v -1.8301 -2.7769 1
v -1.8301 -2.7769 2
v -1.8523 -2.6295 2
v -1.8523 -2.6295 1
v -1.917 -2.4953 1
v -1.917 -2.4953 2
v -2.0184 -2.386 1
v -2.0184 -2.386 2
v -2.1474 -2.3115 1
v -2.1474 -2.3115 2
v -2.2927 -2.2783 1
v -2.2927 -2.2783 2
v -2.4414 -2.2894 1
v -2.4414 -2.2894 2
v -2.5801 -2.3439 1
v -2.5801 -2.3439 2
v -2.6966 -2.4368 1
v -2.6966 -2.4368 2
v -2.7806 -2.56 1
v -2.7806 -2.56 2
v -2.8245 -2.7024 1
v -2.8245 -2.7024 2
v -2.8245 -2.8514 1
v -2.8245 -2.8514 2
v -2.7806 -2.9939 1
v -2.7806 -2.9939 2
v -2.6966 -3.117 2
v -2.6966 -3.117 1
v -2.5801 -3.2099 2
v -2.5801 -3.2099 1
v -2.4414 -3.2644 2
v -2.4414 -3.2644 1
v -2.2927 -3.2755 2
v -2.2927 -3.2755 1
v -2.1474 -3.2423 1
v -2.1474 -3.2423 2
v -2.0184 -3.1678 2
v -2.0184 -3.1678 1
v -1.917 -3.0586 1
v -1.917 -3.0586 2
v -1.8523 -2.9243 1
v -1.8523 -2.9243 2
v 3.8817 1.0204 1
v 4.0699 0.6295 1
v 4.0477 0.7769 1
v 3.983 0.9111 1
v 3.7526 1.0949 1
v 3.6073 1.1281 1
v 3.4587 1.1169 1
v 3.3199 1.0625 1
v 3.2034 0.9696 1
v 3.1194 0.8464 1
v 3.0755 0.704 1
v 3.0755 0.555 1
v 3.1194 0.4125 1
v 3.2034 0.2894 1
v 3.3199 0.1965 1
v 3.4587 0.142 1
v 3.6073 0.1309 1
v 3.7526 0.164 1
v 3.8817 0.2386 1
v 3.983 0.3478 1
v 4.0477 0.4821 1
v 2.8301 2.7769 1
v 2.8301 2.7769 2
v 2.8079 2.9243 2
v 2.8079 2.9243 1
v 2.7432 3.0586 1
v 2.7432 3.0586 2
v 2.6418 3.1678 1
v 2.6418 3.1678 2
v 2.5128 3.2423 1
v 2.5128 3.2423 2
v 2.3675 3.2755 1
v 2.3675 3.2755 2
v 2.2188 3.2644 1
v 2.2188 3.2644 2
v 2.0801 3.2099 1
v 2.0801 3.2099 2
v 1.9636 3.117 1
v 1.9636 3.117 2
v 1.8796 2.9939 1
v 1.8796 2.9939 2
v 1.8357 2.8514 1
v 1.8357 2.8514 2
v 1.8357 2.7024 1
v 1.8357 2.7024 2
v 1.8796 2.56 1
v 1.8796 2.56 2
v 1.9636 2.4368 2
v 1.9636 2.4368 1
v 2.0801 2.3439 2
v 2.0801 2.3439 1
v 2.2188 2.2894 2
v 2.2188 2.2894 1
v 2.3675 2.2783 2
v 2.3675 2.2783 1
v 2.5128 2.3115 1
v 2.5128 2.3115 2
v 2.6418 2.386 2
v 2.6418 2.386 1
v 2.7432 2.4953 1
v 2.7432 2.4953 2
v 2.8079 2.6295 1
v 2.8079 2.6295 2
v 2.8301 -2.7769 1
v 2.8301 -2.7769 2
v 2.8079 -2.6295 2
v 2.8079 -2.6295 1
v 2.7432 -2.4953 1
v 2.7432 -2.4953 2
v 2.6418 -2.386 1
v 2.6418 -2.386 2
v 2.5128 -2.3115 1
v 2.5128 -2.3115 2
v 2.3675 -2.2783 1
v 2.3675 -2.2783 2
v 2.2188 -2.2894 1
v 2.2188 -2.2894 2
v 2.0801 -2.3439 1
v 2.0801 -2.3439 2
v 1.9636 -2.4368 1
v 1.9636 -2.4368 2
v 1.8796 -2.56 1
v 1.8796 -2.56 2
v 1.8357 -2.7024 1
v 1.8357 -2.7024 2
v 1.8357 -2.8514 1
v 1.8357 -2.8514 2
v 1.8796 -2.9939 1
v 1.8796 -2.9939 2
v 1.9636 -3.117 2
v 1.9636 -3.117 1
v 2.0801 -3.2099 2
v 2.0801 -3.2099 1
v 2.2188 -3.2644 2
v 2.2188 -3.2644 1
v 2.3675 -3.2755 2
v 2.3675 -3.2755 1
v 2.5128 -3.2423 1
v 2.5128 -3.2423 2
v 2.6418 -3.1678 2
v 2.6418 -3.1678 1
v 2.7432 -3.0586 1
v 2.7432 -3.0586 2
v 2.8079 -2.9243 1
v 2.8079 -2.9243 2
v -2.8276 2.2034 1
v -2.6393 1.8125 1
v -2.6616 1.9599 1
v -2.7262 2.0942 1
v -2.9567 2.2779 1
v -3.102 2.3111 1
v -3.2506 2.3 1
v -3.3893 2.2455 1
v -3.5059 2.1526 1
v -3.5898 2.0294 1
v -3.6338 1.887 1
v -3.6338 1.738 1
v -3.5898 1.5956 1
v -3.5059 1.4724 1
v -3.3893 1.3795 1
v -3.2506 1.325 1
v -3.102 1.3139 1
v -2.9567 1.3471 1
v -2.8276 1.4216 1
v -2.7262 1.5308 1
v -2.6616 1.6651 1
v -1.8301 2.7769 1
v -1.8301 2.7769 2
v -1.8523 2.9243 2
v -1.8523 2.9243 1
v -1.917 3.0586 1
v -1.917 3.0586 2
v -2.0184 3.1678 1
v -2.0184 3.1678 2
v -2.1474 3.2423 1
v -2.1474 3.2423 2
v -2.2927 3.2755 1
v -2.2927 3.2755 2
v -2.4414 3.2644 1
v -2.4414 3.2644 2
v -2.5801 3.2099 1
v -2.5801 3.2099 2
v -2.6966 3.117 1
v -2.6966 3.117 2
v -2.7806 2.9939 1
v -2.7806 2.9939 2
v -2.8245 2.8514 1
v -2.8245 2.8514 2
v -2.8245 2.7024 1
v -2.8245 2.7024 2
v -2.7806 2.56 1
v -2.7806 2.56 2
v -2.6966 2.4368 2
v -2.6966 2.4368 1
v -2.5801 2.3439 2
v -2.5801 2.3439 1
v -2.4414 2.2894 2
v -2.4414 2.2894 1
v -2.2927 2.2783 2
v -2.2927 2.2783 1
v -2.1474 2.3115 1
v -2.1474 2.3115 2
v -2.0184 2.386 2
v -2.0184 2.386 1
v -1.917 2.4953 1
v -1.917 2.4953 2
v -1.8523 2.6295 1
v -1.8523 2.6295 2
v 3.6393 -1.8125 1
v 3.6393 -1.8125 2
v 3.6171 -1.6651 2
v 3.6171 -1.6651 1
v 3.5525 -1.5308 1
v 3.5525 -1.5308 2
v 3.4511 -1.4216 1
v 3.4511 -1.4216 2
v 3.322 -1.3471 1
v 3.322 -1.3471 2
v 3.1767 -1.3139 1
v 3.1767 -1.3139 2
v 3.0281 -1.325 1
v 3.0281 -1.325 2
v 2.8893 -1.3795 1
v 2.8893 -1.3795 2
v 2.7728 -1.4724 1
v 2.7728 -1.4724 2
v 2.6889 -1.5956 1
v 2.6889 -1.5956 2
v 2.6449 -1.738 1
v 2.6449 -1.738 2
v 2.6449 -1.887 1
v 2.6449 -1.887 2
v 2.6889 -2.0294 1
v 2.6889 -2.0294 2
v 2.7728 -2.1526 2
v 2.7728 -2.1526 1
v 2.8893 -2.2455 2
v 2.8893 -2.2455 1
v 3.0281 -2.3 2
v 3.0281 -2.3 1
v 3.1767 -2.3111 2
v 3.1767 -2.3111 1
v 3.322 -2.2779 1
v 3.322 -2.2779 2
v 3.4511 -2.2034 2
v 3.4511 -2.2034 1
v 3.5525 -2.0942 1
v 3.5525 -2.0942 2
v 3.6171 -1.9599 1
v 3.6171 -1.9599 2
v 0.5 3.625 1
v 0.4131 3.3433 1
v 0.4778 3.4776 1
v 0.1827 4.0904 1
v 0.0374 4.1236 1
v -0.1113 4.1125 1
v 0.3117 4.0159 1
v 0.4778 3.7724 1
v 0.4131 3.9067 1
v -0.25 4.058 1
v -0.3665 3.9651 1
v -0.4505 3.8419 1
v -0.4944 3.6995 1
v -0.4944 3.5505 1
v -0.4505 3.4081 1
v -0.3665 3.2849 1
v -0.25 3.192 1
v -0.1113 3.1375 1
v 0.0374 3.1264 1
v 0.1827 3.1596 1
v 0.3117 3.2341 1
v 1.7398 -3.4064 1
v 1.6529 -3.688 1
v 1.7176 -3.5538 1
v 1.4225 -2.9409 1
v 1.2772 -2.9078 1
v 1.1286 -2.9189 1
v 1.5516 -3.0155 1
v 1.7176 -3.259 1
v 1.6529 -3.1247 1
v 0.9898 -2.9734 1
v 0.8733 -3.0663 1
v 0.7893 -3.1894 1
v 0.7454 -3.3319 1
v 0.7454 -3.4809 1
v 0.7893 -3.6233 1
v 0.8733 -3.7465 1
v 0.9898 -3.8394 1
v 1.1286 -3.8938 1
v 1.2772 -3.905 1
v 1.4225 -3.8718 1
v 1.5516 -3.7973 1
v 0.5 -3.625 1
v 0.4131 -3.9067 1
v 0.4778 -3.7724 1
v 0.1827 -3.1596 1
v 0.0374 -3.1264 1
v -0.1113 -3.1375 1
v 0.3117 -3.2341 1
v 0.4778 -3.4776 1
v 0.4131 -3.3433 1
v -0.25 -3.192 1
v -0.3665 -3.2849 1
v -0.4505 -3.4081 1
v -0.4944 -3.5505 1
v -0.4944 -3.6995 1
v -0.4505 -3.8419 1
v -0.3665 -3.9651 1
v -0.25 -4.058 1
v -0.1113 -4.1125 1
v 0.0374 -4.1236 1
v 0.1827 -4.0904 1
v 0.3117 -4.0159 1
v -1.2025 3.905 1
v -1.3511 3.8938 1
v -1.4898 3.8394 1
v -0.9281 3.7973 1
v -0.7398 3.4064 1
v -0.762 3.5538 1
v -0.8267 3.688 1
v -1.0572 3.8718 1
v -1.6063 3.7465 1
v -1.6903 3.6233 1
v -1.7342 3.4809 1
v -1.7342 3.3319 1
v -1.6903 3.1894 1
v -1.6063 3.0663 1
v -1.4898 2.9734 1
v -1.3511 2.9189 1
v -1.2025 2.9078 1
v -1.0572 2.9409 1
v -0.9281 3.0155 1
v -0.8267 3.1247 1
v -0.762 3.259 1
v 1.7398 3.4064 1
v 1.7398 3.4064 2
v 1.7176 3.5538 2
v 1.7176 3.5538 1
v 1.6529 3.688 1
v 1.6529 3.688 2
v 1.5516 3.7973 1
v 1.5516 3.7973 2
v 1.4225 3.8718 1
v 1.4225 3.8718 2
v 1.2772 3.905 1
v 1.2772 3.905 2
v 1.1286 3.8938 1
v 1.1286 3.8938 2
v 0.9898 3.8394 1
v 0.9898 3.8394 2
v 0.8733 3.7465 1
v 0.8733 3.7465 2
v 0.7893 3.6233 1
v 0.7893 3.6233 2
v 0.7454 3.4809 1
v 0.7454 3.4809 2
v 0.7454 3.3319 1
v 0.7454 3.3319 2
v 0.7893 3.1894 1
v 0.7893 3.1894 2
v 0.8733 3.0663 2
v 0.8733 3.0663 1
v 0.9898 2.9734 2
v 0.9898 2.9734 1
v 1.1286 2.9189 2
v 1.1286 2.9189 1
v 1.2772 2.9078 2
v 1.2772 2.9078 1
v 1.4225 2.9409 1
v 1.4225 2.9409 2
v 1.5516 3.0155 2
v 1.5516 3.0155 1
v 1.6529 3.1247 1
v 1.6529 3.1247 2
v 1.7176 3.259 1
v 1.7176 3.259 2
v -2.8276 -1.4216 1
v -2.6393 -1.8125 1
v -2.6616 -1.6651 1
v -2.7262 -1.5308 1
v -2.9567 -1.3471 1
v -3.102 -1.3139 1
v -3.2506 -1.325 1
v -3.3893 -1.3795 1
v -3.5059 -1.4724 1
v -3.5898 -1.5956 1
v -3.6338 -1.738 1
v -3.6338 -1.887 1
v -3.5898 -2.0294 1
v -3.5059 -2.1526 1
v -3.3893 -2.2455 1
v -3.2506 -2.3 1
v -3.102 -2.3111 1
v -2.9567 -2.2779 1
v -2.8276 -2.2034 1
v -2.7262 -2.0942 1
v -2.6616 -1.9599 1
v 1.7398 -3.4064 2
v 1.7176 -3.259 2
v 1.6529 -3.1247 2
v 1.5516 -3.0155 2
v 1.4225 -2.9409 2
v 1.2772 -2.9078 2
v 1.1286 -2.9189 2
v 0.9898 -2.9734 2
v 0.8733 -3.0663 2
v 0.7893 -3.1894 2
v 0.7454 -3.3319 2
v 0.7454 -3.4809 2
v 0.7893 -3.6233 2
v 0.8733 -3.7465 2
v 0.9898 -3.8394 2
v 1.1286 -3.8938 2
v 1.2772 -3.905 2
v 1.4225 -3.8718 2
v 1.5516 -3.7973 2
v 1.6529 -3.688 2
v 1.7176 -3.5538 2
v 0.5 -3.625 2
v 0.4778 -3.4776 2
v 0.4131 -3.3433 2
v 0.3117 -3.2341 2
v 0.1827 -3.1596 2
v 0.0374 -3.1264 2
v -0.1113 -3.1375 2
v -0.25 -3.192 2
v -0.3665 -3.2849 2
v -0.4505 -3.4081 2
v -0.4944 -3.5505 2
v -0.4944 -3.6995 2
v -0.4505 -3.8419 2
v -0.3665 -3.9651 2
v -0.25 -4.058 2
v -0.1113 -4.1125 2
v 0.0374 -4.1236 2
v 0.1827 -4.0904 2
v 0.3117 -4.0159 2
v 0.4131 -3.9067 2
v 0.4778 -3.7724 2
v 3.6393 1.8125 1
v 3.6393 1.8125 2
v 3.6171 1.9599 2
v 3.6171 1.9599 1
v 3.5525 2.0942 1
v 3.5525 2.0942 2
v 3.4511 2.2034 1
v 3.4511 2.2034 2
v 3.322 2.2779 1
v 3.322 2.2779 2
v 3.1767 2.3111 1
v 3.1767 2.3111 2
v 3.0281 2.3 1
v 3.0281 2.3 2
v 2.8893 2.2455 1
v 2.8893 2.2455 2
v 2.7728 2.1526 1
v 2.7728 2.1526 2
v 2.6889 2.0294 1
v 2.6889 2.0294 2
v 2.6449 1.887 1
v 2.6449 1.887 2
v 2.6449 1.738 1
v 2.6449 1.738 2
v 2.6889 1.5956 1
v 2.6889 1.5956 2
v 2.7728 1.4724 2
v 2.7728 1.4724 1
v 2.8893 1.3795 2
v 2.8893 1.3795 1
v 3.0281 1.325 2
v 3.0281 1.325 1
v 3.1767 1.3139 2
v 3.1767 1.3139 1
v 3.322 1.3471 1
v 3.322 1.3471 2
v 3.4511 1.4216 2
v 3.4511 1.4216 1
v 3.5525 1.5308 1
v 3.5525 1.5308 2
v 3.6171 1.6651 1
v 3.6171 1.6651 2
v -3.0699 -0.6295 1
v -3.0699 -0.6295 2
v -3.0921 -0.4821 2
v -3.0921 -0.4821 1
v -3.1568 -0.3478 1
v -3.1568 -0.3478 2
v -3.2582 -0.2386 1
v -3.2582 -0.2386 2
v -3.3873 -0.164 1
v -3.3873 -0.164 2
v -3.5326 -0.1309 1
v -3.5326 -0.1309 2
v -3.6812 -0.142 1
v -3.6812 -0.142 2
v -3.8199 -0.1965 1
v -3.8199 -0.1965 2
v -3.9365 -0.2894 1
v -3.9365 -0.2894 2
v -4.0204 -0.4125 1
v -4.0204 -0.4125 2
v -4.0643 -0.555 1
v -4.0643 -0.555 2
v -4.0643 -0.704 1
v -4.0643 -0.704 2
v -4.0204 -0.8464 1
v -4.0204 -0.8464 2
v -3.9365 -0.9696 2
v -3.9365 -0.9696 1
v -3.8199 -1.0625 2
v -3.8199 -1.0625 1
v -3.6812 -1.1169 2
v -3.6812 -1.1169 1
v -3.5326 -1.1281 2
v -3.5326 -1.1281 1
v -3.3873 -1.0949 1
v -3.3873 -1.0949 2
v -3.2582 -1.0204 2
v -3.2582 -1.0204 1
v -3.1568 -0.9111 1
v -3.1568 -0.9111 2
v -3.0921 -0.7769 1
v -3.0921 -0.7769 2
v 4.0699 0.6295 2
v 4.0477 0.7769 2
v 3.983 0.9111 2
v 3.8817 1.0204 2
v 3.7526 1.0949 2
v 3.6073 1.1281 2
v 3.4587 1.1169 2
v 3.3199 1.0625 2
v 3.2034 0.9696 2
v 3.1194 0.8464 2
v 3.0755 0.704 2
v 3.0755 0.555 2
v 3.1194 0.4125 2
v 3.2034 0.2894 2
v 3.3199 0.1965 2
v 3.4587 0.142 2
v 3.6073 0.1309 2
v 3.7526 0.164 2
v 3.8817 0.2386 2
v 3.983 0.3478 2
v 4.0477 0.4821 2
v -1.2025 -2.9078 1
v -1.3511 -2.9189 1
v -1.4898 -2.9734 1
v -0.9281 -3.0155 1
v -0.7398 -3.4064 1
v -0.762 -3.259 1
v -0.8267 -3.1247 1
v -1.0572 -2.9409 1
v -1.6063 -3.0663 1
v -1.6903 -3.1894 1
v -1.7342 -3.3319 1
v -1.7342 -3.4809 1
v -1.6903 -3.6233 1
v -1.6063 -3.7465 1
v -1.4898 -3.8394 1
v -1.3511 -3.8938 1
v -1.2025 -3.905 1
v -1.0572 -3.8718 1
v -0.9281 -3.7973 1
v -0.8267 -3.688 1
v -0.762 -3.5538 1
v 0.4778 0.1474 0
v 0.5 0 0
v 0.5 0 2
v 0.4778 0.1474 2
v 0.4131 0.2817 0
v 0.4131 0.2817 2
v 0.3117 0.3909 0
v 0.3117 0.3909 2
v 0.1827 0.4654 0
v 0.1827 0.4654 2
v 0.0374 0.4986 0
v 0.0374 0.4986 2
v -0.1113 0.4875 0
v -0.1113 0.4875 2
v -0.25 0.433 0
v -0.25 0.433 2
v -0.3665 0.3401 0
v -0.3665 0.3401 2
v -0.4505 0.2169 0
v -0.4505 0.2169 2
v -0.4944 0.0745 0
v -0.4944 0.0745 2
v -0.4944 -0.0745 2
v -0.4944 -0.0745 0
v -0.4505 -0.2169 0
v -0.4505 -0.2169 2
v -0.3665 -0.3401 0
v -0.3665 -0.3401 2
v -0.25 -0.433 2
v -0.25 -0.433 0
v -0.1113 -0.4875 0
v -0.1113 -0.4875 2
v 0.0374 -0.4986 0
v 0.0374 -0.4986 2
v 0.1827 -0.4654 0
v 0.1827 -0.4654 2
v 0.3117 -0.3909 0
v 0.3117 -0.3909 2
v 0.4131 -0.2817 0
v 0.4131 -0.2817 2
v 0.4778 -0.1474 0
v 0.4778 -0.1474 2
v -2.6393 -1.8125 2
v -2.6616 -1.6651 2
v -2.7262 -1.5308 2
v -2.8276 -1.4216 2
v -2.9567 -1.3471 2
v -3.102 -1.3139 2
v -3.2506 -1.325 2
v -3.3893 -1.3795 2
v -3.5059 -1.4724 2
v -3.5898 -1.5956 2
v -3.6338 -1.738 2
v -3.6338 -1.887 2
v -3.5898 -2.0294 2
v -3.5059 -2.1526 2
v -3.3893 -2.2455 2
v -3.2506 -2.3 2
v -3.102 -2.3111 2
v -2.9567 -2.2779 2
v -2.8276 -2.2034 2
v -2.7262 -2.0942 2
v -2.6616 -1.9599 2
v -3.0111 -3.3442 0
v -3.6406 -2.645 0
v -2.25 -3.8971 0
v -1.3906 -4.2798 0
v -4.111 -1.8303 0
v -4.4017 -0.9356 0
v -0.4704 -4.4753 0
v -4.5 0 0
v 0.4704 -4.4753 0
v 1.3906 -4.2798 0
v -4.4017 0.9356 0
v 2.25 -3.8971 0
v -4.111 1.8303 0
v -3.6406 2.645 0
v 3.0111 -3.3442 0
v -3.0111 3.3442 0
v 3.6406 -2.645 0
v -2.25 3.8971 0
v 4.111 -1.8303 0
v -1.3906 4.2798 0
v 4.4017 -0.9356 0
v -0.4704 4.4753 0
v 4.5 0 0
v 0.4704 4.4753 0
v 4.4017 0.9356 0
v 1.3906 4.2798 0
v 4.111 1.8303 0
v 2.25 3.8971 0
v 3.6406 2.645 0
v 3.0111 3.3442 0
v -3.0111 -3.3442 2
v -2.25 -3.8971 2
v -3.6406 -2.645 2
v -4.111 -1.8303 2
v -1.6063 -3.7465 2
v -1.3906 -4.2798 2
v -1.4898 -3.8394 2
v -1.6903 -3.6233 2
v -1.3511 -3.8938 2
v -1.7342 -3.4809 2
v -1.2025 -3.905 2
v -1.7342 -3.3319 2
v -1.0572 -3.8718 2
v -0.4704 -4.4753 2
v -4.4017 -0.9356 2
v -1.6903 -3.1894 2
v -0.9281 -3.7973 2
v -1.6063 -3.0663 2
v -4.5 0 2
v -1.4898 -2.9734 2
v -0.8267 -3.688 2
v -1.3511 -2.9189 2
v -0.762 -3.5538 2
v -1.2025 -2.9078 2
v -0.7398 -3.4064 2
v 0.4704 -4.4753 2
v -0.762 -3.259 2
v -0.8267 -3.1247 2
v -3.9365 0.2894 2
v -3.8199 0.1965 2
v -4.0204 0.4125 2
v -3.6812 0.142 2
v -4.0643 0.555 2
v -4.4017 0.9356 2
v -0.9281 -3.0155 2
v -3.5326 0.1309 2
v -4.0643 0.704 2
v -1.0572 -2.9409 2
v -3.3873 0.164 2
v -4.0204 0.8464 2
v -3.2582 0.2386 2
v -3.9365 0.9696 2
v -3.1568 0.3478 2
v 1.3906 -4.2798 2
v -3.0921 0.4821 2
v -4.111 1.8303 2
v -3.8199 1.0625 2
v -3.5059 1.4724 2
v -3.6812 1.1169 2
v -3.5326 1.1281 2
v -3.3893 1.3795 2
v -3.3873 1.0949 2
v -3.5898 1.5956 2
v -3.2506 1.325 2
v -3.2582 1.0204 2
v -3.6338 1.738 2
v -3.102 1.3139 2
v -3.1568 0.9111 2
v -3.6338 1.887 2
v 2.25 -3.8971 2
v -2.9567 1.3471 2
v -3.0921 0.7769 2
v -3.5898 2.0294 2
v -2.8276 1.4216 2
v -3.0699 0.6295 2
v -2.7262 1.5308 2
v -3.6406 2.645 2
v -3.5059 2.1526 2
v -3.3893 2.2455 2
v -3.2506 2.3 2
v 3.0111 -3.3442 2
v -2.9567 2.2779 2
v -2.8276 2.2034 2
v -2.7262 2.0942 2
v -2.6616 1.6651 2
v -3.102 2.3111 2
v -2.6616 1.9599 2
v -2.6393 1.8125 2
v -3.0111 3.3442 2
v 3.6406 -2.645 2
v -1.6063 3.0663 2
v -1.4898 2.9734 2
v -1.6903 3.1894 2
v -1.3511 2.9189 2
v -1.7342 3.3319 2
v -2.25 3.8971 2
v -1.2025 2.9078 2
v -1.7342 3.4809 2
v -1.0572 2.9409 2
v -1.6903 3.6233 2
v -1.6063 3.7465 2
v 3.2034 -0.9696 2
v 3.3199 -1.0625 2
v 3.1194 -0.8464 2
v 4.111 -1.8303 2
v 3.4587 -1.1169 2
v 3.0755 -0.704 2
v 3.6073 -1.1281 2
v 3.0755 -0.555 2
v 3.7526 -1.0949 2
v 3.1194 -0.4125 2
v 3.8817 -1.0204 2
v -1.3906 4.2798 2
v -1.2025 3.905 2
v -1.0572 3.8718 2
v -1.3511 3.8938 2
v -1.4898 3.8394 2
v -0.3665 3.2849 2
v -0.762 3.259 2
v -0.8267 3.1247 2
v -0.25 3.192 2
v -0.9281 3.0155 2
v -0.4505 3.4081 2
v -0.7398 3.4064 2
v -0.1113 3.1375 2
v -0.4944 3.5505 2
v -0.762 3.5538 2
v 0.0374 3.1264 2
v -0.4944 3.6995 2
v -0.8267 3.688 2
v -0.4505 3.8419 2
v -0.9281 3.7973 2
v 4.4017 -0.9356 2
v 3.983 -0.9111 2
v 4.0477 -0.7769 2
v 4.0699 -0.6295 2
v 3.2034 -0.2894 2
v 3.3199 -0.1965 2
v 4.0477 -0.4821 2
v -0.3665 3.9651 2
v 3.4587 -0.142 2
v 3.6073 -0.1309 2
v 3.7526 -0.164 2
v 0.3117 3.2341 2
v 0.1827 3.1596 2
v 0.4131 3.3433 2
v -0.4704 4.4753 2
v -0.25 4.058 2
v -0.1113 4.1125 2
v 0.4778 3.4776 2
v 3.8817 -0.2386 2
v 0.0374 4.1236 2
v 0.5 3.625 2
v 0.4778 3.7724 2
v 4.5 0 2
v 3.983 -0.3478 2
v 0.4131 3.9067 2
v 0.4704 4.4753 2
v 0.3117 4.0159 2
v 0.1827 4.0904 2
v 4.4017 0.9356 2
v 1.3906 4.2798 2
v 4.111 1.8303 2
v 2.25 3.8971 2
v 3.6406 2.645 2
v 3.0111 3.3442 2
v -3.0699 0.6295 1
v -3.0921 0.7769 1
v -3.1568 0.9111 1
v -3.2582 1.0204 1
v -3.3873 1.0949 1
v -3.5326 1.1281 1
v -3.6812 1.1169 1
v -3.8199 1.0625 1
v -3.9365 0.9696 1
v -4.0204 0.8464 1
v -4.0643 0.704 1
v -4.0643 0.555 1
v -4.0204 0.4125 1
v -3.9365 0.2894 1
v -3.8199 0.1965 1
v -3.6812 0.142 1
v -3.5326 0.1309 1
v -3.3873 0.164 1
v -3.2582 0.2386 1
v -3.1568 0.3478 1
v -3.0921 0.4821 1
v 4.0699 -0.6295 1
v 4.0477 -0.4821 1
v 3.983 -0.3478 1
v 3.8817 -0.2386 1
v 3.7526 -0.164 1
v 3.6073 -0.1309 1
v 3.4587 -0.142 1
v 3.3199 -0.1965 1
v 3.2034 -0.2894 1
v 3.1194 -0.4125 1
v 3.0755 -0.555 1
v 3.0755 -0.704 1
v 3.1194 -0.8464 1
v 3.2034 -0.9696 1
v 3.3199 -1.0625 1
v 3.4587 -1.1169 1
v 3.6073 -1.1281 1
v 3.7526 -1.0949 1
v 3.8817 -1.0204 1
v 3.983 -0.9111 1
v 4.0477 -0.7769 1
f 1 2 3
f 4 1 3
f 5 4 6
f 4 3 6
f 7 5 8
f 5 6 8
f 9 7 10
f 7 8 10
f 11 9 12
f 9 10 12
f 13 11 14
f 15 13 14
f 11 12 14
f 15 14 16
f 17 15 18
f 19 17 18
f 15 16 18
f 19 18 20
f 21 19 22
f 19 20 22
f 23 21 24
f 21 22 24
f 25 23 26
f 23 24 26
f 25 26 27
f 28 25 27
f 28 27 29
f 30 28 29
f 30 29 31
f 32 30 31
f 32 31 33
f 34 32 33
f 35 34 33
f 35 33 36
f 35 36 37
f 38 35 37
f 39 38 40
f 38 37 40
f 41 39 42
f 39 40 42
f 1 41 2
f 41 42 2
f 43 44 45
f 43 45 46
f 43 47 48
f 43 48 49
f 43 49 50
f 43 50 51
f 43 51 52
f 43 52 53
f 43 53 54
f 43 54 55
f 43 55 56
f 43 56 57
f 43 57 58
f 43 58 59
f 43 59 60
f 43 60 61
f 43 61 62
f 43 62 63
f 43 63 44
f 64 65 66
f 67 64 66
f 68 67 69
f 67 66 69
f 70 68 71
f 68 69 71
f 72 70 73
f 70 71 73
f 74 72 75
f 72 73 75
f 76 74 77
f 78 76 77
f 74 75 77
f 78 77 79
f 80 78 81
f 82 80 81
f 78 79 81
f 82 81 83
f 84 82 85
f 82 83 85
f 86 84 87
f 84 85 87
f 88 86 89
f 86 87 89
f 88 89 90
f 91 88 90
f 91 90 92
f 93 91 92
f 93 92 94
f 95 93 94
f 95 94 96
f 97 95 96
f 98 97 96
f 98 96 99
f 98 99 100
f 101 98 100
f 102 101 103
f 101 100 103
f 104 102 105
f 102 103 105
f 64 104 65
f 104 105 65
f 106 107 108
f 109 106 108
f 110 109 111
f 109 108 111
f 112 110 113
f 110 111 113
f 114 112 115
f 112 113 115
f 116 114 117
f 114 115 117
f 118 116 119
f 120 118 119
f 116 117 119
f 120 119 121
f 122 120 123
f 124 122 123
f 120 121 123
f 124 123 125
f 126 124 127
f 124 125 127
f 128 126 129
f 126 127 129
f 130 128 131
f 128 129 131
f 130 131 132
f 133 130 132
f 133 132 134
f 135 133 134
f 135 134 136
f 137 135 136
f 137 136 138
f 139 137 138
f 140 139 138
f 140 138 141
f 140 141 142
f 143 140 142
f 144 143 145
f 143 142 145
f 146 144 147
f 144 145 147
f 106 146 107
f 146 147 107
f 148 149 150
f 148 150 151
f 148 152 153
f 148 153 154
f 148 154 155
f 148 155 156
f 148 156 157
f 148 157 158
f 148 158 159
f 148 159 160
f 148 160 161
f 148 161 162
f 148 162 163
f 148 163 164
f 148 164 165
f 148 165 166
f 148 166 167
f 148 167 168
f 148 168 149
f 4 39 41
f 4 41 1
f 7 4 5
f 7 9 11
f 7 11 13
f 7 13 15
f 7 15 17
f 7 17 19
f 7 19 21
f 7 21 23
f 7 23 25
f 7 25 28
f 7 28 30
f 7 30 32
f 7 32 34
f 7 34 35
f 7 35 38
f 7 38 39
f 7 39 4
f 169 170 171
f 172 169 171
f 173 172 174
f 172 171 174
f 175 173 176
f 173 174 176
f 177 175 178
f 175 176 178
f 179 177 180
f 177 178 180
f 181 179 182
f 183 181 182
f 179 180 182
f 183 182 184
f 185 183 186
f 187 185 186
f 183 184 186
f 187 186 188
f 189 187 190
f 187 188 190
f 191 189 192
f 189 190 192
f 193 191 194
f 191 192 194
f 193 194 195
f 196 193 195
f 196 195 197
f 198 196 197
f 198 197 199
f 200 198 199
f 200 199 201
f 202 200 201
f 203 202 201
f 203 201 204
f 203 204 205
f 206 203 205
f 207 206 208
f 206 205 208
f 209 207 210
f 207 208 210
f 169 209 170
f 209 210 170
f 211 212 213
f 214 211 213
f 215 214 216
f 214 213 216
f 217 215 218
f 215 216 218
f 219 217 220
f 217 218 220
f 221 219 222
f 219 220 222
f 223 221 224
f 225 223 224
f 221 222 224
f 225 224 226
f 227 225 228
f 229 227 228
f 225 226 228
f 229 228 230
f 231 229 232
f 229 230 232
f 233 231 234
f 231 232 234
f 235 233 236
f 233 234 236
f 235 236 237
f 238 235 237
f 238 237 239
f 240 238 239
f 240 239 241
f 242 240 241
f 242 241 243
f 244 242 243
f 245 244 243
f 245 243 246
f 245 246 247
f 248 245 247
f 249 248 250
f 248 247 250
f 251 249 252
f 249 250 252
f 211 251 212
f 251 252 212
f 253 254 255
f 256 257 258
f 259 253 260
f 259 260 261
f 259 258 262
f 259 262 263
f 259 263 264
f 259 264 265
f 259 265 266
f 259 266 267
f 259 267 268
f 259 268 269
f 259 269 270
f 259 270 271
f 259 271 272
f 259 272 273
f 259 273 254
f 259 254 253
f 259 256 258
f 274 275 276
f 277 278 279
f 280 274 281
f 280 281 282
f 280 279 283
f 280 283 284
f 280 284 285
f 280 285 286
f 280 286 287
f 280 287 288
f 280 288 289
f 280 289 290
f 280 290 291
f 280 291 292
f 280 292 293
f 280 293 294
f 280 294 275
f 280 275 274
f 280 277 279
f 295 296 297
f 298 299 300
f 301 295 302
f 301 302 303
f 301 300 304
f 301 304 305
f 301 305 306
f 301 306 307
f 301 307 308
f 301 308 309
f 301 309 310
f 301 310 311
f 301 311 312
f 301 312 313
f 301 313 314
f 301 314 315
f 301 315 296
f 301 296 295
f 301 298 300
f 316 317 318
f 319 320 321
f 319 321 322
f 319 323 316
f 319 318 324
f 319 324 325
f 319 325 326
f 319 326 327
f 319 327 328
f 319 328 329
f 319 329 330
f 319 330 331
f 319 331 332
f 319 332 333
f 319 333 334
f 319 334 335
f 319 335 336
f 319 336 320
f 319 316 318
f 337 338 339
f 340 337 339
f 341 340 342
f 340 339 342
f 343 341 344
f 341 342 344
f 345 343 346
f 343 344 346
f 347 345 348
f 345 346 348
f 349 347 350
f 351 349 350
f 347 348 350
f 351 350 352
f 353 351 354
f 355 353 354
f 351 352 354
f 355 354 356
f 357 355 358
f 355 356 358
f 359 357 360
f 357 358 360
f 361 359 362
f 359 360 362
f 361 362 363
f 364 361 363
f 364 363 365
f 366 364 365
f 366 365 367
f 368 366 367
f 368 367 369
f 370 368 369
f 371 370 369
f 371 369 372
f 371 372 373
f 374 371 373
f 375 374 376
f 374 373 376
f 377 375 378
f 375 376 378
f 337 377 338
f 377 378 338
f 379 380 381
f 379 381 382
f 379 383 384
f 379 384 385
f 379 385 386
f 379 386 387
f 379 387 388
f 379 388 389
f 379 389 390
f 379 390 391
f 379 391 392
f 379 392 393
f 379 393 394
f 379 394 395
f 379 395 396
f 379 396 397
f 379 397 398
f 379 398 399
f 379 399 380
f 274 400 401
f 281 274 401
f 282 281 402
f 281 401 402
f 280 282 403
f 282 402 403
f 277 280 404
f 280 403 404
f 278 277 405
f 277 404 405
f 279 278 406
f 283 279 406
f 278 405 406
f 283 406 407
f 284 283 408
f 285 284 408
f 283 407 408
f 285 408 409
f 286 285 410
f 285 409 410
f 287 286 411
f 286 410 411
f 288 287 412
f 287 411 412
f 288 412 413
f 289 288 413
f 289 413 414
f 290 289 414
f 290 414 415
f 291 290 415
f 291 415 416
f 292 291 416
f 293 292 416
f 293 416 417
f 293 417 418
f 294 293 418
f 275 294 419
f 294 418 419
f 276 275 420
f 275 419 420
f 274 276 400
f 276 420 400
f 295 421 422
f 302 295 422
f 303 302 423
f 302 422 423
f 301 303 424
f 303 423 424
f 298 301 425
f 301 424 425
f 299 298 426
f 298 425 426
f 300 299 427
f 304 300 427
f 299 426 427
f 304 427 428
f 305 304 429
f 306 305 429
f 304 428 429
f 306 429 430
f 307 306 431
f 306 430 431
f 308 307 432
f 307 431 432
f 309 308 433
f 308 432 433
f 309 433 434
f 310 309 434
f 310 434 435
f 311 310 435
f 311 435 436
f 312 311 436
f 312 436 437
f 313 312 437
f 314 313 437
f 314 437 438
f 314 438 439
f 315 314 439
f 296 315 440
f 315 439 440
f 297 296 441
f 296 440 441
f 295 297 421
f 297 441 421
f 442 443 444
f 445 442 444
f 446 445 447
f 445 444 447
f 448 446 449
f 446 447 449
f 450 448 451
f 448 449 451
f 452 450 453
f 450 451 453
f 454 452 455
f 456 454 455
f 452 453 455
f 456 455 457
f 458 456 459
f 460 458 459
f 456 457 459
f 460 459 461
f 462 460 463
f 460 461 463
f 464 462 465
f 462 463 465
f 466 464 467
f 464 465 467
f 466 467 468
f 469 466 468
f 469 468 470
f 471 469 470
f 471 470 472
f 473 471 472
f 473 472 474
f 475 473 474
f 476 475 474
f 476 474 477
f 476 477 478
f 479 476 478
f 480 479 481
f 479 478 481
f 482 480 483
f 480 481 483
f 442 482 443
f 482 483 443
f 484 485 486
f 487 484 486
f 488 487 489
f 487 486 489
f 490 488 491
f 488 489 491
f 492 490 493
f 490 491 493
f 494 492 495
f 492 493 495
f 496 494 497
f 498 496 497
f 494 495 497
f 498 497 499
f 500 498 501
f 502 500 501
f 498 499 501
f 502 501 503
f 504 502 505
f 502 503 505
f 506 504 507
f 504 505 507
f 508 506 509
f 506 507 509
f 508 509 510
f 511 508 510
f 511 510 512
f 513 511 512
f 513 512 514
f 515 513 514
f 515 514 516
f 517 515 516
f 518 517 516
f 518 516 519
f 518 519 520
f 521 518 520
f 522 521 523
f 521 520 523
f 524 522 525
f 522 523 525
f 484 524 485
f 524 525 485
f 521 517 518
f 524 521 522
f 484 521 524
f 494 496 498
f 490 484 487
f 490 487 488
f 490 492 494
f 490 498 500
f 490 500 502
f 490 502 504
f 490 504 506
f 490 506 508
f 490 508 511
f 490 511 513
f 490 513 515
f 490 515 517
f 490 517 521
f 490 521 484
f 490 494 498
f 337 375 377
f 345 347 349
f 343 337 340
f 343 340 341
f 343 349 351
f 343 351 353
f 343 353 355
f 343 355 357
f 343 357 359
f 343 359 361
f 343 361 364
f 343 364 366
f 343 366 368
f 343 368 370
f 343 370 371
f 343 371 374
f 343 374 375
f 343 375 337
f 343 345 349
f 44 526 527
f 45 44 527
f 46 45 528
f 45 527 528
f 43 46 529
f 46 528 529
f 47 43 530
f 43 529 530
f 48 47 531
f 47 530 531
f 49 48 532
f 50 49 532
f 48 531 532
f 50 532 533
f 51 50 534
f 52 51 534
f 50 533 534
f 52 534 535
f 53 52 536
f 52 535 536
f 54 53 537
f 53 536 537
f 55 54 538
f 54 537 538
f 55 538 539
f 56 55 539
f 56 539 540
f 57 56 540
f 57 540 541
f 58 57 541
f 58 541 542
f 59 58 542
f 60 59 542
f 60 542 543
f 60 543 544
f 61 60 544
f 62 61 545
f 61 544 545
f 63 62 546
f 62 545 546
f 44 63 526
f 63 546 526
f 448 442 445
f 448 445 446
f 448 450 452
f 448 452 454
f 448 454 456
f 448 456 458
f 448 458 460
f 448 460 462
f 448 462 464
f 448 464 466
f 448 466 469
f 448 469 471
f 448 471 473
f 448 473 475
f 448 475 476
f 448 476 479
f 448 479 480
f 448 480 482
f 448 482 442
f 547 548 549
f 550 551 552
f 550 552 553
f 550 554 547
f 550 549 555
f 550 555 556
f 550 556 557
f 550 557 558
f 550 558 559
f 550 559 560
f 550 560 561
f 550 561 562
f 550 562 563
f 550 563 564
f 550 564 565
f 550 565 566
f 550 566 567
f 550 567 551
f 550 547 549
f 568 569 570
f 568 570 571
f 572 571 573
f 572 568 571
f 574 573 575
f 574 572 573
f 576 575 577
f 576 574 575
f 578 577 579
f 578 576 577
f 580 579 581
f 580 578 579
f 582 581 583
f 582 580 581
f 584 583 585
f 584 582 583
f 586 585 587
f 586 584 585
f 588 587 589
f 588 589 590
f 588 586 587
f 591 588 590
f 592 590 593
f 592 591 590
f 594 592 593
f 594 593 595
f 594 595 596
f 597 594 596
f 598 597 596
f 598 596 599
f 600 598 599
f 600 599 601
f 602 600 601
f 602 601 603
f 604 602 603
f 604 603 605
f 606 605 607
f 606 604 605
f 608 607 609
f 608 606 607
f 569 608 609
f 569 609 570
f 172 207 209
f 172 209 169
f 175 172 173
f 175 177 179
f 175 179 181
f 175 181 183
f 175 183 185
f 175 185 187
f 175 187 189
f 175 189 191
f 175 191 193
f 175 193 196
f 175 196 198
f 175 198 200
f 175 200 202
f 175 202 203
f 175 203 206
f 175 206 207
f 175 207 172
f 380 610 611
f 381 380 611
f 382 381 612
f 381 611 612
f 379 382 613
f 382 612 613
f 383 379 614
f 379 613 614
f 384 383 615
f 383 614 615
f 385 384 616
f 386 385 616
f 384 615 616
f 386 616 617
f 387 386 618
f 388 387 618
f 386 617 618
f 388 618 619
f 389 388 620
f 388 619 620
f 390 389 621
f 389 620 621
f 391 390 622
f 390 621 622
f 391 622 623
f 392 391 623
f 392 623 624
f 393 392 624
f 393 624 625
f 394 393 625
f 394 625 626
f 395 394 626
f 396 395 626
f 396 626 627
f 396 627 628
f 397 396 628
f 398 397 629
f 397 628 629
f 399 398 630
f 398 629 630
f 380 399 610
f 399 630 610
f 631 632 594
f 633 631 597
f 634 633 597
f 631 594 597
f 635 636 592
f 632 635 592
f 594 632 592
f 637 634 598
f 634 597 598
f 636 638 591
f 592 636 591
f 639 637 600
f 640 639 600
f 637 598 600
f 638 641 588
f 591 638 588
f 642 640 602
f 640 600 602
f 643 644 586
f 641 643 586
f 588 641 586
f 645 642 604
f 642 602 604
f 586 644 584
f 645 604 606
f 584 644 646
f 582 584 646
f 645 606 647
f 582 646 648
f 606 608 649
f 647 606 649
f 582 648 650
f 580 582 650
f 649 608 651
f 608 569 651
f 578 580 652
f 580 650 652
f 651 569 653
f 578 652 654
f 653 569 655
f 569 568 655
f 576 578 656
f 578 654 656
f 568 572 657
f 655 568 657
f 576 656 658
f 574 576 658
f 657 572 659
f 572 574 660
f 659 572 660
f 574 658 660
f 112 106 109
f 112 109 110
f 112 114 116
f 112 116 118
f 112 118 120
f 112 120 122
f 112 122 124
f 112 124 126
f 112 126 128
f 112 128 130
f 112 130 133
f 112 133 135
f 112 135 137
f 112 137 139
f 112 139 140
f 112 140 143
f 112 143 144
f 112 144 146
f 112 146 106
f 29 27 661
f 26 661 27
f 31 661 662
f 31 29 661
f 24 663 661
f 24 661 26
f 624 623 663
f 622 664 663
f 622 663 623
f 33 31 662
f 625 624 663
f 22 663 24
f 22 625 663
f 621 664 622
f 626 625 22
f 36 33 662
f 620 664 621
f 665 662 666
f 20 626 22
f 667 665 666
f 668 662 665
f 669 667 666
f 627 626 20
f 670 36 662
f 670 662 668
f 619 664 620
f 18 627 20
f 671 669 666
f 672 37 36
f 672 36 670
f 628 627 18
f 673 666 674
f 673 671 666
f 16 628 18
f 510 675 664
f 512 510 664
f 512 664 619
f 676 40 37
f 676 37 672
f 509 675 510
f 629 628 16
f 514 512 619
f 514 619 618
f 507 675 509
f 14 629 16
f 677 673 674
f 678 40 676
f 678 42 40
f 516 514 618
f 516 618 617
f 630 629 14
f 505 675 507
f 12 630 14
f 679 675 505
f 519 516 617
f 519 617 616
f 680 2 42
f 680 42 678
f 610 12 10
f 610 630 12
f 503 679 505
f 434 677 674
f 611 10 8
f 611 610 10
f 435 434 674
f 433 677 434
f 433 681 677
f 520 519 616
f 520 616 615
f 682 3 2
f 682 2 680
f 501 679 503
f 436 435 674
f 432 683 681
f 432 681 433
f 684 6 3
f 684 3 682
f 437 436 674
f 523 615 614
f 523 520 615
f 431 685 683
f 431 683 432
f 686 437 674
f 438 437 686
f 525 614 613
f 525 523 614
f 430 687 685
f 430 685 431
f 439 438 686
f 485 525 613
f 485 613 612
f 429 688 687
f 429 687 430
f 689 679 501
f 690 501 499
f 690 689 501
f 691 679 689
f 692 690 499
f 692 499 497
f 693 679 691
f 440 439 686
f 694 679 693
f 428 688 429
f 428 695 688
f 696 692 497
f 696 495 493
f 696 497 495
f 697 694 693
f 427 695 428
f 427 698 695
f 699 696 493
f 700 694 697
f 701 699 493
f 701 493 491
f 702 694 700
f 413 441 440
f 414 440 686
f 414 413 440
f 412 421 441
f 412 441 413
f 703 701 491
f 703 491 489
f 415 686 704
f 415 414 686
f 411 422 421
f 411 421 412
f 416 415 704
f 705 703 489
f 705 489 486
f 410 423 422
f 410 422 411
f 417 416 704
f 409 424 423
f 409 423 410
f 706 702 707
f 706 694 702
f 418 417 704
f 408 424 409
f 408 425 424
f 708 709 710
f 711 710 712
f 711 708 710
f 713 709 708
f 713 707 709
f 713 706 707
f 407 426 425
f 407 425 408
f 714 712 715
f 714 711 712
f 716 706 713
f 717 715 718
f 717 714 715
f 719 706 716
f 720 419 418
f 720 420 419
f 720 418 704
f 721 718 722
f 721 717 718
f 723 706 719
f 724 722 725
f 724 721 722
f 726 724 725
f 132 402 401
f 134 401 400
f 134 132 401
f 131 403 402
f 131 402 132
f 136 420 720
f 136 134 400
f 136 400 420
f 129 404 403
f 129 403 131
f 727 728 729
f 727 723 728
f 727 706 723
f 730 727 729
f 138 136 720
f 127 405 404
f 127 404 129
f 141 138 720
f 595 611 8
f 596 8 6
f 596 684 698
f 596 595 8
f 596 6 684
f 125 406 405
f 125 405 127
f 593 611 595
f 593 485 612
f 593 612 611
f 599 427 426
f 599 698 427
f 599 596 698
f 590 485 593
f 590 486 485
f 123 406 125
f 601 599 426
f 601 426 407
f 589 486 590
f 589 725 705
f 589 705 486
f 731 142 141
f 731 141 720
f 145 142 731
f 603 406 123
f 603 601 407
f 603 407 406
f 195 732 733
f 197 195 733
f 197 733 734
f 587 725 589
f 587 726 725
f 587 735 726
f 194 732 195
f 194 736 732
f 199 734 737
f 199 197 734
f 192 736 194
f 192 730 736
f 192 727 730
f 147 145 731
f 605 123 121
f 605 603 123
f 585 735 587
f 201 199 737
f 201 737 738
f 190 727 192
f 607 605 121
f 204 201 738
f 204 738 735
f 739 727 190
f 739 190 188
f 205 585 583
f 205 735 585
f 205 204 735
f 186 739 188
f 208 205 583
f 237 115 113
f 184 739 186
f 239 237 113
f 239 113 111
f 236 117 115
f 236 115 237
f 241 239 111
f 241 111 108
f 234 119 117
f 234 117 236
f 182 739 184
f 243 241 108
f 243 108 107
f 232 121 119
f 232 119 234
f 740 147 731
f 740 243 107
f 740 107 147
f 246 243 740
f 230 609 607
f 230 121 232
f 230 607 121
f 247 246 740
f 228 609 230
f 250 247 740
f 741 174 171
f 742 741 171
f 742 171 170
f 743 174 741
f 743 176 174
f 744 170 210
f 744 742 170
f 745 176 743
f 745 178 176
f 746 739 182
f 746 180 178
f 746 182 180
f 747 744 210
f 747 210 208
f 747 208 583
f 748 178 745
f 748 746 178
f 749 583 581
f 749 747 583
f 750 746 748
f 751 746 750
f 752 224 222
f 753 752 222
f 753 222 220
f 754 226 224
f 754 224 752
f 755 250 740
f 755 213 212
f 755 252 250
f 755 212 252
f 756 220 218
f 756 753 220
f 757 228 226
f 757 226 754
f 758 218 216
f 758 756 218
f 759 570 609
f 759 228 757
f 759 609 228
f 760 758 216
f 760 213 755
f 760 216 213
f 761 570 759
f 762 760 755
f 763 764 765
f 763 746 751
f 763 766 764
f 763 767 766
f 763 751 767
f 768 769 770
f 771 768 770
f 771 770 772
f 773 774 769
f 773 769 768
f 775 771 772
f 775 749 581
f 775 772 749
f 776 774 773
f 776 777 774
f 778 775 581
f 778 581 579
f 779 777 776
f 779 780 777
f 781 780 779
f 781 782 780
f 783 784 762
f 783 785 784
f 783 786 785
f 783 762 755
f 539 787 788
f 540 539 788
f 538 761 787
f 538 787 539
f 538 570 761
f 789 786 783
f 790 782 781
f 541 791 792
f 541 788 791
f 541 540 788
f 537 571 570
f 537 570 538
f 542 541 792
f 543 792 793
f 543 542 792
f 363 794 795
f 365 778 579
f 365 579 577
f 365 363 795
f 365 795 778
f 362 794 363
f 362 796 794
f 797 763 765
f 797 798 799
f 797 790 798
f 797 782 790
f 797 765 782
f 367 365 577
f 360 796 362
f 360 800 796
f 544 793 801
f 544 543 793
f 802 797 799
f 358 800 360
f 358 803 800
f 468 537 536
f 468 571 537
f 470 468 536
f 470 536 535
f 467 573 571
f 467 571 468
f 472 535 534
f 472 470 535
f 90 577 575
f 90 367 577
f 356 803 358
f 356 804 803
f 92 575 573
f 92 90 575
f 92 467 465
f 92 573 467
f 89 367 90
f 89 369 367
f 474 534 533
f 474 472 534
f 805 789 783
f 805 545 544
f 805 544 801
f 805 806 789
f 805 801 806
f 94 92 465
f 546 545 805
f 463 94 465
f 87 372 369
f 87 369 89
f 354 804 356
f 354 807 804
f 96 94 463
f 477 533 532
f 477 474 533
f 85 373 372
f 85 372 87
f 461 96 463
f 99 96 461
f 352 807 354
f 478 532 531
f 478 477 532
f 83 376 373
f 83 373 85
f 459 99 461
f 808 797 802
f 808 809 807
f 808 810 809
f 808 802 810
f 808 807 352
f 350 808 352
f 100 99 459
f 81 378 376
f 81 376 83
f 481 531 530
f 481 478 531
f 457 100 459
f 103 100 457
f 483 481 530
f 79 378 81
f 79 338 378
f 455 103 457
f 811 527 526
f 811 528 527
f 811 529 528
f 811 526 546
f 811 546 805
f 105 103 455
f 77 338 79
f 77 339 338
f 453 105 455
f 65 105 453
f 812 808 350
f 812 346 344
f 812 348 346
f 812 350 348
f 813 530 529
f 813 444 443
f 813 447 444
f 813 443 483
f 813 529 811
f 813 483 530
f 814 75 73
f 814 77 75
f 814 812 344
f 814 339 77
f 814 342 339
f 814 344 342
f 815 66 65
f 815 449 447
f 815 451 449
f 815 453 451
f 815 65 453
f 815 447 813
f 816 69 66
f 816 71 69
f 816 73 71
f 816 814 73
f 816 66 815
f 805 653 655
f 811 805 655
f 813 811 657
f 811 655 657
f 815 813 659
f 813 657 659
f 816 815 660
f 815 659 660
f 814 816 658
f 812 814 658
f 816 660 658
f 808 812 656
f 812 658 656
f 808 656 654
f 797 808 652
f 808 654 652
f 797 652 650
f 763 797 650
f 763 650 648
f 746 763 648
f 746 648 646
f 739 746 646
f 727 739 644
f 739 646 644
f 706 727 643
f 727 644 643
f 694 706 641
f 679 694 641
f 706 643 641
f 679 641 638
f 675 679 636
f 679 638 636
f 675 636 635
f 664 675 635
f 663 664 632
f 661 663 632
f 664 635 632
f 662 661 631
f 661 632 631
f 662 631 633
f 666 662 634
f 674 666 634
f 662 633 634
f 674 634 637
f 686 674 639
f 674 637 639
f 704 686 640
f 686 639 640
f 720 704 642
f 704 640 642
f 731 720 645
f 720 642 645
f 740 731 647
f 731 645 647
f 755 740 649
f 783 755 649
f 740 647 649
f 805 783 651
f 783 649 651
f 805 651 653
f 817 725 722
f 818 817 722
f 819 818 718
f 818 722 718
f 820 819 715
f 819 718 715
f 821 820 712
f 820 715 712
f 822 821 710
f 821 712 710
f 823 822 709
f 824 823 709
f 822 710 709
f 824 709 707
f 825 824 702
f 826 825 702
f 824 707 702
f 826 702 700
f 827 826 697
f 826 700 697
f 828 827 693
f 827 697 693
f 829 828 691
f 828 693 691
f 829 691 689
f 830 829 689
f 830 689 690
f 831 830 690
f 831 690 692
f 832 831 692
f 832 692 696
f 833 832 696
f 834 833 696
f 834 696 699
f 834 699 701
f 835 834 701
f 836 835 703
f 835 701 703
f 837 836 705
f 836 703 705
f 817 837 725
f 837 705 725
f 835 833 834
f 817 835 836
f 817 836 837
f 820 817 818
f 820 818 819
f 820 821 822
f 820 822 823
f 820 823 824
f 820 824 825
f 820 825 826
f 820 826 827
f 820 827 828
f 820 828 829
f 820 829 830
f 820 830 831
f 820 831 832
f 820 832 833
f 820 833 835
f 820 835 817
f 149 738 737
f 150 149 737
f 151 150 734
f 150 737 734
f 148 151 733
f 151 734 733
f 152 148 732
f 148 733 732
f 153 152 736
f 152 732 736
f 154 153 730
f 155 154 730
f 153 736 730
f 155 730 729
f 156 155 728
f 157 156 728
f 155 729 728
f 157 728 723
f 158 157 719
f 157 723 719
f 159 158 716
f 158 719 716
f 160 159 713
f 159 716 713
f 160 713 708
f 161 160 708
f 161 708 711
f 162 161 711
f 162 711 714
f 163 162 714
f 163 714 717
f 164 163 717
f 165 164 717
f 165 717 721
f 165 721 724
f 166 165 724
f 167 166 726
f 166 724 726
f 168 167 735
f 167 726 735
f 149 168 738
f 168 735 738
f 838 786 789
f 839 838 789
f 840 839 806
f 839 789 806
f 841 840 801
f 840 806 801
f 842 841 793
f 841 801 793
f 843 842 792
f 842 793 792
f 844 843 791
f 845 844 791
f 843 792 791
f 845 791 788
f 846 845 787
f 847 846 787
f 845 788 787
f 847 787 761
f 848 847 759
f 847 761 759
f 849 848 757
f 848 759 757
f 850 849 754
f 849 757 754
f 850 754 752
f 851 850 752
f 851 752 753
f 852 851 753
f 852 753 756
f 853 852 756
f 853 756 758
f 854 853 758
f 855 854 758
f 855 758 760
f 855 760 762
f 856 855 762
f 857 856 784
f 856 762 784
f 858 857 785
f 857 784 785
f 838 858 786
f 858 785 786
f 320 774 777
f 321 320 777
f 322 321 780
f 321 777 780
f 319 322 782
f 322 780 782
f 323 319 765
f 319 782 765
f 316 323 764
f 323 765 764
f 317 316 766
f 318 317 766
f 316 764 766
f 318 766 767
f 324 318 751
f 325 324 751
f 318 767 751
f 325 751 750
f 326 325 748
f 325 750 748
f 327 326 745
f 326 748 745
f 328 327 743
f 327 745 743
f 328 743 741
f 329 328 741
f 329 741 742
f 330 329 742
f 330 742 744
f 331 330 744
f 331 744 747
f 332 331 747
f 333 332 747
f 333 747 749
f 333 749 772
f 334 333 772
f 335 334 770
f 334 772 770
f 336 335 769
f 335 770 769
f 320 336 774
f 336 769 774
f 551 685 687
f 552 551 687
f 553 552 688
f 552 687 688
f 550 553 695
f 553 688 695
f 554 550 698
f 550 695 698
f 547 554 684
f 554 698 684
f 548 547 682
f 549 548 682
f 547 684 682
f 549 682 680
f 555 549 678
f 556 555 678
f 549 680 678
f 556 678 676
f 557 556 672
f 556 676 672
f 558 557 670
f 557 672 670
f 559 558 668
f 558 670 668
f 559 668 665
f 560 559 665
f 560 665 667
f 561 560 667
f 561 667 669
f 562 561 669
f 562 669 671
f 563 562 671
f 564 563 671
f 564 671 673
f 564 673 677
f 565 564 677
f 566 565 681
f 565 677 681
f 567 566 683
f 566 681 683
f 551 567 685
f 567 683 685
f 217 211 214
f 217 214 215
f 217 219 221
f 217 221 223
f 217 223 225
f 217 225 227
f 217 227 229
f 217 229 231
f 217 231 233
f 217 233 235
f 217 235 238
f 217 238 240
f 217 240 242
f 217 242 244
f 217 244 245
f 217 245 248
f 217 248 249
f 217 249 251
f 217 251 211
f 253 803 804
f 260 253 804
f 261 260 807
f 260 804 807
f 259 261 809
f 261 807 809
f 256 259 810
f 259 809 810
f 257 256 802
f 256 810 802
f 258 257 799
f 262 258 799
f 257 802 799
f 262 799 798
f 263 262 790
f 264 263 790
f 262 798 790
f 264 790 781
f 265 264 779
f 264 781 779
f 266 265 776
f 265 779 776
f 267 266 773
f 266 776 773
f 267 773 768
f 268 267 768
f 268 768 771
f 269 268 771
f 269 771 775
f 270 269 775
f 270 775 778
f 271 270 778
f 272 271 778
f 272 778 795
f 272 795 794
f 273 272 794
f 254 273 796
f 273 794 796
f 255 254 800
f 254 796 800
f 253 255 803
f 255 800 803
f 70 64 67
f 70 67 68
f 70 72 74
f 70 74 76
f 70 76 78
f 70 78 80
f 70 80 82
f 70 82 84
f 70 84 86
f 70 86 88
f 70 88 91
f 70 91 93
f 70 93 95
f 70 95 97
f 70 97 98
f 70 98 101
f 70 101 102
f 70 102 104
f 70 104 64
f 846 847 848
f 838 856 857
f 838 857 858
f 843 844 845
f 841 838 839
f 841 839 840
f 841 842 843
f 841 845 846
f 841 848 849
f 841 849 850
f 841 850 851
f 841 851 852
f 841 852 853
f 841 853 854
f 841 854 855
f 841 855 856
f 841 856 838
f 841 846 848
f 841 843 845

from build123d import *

# Parameters (mm, degrees)
SZKIC1_R                    = 4.5
SZKIC1_R_2                  = 0.5
DODANIE_WYCI_GNI_CIE1_DEPTH = 2
SZKIC2_R                    = 0.5
WYTNIJ_WYCI_GNI_CIE2_DEPTH  = 1


with BuildPart() as part:
    # Szkic1 → Dodanie-wyciągnięcie1 (new body)
    with BuildSketch(Plane.XY):
        Circle(SZKIC1_R)
        Circle(SZKIC1_R_2, mode=Mode.SUBTRACT)
    extrude(amount=DODANIE_WYCI_GNI_CIE1_DEPTH)

    # Szkic2 → Wytnij-wyciągnięcie2 (cut)
    with BuildSketch(Plane.XY.offset(2)):
        with Locations((0, 3.625)):
            Circle(SZKIC2_R)
        with Locations((1.23982302, 3.40638575)):
            Circle(SZKIC2_R)
        with Locations((2.330105085, 2.776911106)):
            Circle(SZKIC2_R)
        with Locations((3.139342089, 1.8125)):
            Circle(SZKIC2_R)
        with Locations((3.569928105, 0.629474644)):
            Circle(SZKIC2_R)
        with Locations((3.569928105, -0.629474644)):
            Circle(SZKIC2_R)
        with Locations((3.139342089, -1.8125)):
            Circle(SZKIC2_R)
        with Locations((2.330105085, -2.776911106)):
            Circle(SZKIC2_R)
        with Locations((1.23982302, -3.40638575)):
            Circle(SZKIC2_R)
        with Locations((0, -3.625)):
            Circle(SZKIC2_R)
        with Locations((-1.23982302, -3.40638575)):
            Circle(SZKIC2_R)
        with Locations((-2.330105085, -2.776911106)):
            Circle(SZKIC2_R)
        with Locations((-3.139342089, -1.8125)):
            Circle(SZKIC2_R)
        with Locations((-3.569928105, -0.629474644)):
            Circle(SZKIC2_R)
        with Locations((-3.569928105, 0.629474644)):
            Circle(SZKIC2_R)
        with Locations((-3.139342089, 1.8125)):
            Circle(SZKIC2_R)
        with Locations((-2.330105085, 2.776911106)):
            Circle(SZKIC2_R)
        with Locations((-1.23982302, 3.40638575)):
            Circle(SZKIC2_R)
    extrude(amount=-WYTNIJ_WYCI_GNI_CIE2_DEPTH, mode=Mode.SUBTRACT)


solid = part.part
